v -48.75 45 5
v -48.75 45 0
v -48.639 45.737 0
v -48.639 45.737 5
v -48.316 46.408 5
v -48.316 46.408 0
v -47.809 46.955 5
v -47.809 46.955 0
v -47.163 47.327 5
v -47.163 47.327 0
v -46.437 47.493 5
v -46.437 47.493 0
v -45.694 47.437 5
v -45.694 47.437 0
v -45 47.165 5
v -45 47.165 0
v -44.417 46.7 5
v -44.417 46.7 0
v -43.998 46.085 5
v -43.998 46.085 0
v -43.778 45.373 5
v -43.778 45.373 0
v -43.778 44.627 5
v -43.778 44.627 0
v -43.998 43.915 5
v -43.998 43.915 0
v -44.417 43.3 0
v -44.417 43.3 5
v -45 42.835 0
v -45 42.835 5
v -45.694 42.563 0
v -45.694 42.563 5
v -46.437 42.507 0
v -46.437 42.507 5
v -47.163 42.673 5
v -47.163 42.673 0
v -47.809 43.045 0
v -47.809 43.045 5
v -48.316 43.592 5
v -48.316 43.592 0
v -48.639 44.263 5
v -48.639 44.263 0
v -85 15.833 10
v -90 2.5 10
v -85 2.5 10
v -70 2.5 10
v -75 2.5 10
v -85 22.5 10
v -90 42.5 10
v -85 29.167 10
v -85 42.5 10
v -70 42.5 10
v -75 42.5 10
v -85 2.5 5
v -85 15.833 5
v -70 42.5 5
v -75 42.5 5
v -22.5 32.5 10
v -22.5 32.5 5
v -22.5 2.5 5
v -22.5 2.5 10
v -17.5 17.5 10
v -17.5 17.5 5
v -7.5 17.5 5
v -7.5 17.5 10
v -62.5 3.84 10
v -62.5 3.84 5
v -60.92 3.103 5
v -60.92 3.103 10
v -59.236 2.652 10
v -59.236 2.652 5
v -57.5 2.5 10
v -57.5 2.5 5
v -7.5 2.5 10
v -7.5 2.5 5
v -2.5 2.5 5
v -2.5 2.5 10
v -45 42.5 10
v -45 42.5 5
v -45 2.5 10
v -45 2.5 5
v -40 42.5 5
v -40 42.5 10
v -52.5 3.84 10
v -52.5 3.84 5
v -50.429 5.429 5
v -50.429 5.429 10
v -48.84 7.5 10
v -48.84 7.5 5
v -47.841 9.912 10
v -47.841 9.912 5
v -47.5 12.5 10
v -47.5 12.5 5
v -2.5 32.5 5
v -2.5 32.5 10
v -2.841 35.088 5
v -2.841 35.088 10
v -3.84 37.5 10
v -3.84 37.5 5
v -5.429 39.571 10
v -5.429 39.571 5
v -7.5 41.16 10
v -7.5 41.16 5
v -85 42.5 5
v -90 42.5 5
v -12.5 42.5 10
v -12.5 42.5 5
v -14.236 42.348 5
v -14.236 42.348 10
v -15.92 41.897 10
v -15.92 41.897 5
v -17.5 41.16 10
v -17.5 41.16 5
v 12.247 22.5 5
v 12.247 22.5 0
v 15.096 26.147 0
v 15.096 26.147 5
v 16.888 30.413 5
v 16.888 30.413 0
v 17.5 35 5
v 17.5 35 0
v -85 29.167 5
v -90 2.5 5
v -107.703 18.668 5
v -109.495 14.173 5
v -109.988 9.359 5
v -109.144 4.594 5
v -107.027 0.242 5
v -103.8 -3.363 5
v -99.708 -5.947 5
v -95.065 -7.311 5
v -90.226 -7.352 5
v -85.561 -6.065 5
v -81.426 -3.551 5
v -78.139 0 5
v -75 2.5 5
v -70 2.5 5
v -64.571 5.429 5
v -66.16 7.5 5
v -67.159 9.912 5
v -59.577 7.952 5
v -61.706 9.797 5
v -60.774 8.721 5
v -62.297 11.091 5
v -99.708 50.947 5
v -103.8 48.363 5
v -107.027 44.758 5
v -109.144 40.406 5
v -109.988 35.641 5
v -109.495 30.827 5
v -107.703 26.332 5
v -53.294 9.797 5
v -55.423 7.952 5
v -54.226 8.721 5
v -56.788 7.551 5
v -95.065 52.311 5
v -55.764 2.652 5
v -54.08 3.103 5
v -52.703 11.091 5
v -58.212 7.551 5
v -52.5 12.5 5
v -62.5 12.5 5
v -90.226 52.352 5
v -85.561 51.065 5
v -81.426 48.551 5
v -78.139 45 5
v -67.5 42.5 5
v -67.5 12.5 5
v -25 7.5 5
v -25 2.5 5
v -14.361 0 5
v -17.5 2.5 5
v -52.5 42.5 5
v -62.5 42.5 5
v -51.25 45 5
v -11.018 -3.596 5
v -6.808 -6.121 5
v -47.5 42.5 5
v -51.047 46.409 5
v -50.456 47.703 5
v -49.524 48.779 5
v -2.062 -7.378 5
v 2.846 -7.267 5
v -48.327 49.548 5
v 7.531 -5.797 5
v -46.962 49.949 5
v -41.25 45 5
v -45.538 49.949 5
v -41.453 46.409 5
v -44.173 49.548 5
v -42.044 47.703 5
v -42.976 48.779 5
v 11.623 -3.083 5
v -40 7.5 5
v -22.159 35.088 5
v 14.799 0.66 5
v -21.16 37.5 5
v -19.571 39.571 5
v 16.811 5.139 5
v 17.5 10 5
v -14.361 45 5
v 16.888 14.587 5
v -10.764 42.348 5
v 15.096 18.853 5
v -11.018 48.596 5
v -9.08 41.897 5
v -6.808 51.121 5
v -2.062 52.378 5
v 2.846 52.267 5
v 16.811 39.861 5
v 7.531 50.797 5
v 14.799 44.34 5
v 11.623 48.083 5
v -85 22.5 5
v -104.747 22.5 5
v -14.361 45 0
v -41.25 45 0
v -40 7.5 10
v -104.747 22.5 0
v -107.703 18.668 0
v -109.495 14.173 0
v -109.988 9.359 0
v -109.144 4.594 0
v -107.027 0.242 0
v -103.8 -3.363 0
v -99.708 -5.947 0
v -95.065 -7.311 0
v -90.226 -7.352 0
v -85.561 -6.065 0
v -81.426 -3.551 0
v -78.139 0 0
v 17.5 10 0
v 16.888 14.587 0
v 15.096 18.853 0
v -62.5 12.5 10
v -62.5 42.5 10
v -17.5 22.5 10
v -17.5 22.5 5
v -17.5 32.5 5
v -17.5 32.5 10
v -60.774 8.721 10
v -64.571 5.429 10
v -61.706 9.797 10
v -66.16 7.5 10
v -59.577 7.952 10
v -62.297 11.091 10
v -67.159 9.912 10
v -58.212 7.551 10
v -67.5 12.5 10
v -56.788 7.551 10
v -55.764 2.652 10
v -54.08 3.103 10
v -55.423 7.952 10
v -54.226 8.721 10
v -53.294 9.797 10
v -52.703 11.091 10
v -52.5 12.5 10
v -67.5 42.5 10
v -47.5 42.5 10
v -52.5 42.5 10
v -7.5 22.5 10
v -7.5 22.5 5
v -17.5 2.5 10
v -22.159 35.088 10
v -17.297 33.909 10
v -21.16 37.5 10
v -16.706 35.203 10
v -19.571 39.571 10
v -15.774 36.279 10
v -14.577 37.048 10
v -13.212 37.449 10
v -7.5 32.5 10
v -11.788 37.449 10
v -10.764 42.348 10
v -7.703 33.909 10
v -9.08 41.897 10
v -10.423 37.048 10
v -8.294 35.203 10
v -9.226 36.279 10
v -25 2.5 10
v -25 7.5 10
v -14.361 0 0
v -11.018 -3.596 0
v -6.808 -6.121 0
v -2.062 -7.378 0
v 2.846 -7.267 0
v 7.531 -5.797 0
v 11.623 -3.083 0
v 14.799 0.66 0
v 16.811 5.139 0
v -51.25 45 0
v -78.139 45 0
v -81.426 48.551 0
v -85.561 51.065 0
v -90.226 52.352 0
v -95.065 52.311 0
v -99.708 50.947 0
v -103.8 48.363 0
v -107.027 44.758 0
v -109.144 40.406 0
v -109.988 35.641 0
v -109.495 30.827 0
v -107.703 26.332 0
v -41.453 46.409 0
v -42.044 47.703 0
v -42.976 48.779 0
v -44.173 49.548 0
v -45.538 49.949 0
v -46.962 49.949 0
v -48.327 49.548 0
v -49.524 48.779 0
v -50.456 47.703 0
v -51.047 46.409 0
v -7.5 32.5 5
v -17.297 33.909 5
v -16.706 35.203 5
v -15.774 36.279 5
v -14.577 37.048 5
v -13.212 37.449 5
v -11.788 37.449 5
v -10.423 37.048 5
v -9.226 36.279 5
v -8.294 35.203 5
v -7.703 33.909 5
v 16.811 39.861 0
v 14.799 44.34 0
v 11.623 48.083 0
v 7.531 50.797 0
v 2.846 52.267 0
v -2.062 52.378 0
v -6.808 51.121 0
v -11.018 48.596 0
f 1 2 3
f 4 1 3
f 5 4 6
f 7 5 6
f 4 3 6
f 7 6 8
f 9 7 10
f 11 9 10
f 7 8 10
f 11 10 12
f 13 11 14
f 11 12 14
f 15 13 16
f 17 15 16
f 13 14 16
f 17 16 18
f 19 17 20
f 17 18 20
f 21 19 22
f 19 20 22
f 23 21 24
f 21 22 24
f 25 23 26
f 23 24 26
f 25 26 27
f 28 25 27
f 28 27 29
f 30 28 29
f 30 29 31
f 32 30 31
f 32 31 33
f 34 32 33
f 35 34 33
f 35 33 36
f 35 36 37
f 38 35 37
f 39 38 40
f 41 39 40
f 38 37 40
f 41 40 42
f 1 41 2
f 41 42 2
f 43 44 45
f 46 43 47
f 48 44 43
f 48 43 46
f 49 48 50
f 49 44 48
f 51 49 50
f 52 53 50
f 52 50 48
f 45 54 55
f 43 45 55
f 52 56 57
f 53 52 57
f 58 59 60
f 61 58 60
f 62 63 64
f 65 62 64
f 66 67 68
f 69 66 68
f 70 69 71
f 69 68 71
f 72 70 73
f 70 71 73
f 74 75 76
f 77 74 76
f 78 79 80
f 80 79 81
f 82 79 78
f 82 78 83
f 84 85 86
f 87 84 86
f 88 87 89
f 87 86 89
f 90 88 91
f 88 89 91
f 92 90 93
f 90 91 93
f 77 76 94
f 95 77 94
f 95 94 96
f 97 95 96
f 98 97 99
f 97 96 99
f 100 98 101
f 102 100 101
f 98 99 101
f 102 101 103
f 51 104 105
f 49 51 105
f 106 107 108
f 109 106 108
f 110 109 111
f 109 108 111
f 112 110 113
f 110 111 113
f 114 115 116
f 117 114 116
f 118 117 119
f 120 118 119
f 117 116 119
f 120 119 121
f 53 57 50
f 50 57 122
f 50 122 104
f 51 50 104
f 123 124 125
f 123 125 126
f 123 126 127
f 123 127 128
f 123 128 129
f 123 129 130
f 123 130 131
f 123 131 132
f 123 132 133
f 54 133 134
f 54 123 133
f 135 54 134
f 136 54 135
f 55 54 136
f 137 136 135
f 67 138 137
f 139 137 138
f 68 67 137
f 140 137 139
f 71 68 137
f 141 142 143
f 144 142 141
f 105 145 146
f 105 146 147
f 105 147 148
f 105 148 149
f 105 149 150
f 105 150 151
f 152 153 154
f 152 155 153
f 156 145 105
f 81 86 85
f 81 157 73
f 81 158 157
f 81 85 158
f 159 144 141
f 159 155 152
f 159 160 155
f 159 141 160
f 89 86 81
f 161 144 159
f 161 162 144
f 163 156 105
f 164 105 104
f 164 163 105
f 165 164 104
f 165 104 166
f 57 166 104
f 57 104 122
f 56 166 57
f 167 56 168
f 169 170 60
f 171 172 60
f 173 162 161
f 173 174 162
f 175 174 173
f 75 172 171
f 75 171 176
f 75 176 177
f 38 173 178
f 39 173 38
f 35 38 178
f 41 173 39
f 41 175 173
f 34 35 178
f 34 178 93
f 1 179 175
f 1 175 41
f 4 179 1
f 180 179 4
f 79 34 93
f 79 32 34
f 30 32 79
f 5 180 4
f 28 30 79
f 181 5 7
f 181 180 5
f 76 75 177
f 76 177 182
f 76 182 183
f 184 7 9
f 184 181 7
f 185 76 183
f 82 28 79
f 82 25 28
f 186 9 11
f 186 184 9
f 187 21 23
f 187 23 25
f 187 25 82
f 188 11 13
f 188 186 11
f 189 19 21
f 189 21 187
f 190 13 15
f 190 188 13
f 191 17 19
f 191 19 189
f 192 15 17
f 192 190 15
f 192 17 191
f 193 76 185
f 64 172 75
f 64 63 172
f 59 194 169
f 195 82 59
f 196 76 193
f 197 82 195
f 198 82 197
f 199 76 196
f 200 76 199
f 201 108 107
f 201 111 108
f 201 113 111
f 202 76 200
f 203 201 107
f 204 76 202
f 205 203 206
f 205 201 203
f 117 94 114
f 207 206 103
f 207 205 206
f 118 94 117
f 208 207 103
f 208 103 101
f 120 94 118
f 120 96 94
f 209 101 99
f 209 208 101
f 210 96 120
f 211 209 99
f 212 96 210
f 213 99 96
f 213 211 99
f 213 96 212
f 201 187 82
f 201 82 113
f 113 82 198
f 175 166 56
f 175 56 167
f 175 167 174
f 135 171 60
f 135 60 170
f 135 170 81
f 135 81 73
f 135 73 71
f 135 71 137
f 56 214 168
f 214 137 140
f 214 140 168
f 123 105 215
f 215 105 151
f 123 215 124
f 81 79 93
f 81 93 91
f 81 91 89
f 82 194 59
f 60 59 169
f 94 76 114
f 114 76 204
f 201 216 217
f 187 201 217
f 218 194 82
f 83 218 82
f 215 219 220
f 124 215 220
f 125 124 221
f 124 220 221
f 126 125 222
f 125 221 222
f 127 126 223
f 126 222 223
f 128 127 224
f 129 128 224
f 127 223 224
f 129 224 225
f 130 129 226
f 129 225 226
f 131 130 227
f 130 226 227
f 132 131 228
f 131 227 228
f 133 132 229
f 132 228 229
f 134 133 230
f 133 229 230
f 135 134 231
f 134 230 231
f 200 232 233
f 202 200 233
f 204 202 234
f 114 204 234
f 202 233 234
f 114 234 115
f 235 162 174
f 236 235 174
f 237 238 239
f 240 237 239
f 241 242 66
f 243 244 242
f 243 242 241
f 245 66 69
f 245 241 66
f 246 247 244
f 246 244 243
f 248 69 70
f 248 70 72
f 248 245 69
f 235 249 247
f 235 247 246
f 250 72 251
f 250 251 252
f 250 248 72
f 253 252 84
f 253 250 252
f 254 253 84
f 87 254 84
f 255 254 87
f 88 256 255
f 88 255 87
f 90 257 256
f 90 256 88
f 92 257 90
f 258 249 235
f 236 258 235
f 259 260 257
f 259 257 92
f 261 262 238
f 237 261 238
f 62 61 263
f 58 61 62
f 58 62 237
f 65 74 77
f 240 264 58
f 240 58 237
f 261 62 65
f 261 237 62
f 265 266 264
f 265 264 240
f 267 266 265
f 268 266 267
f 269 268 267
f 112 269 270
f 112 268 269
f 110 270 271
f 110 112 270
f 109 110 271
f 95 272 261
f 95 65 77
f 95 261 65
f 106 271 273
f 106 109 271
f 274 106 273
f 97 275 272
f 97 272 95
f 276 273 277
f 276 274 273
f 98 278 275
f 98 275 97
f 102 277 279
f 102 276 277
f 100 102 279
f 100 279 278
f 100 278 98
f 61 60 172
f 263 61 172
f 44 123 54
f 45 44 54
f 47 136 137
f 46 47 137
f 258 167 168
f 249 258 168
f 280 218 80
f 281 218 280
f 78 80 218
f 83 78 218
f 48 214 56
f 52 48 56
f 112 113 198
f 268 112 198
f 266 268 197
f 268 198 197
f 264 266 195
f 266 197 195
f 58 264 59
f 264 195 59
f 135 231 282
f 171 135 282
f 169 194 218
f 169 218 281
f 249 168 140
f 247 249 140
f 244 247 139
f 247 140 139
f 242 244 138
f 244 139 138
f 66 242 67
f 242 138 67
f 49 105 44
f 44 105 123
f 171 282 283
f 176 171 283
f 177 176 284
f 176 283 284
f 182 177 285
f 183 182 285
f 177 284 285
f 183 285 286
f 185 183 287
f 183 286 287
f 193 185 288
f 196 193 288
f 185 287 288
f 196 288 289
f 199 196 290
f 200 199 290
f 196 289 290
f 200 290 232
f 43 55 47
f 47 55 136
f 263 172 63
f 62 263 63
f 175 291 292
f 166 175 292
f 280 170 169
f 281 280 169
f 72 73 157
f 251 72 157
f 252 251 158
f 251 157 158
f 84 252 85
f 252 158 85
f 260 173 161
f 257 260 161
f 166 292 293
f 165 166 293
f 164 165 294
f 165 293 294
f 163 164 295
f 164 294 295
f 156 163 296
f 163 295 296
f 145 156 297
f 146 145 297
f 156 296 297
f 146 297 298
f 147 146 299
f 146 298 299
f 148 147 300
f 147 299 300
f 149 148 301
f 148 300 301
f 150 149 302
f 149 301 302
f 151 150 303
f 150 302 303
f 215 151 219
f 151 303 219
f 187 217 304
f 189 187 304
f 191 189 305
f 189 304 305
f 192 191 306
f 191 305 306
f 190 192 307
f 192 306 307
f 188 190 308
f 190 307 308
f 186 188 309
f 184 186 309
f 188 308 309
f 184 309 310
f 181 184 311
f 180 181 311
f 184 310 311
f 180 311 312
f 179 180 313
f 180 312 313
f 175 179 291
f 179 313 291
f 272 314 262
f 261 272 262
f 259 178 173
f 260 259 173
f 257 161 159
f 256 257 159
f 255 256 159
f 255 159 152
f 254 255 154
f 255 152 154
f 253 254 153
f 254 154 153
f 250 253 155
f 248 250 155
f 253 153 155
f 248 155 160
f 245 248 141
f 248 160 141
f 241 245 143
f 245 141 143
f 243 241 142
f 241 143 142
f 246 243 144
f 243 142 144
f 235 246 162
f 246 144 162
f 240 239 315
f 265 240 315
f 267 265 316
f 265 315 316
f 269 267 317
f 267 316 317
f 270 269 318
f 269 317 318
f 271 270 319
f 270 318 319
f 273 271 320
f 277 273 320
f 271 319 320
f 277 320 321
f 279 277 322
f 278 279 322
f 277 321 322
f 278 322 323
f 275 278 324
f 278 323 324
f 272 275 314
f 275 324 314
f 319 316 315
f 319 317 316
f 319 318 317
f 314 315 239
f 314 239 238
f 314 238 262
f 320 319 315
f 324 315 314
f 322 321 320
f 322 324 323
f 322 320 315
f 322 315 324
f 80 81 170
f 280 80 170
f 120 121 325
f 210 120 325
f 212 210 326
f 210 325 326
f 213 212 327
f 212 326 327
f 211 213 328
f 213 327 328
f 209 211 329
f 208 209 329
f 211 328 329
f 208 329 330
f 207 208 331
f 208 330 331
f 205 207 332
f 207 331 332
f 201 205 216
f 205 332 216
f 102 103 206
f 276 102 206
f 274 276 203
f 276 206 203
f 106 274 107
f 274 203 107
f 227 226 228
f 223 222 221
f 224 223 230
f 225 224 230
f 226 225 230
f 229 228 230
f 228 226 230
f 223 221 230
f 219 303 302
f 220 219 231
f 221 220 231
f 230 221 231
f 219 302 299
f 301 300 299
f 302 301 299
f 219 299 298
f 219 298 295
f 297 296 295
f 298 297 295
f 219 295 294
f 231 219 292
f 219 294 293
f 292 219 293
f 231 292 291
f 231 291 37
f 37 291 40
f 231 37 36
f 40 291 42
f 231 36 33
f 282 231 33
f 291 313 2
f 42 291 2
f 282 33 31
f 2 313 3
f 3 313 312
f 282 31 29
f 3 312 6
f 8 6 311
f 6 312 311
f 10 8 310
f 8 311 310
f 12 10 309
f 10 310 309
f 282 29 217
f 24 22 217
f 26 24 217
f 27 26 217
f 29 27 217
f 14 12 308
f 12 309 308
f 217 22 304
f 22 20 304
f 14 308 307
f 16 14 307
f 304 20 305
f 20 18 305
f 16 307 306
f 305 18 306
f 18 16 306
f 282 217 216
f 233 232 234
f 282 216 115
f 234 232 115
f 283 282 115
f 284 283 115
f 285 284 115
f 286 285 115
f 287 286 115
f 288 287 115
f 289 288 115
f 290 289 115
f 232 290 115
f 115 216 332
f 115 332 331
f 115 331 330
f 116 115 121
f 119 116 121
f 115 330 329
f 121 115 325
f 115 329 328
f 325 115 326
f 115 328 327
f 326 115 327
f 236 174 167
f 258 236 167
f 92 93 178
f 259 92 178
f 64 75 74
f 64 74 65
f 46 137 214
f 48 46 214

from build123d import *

# Parameters (mm, degrees)
F1_DEPTH = 5
F2_W     = 5
F2_H     = 35
F2_H_2   = 5
F2_W_2   = 15
F2_H_3   = 15
F3_DEPTH = 5


with BuildPart() as f1:
    # F0 (on Top) → F1 (new body)
    with BuildSketch(Plane.XY):
        with BuildLine():
            Line((-92.5, 45), (-78.1385933837, 45))
            ThreePointArc((-78.1385933837, 45), (-103.7995444379, 48.3630196998), (-104.7474487139, 22.5))
            ThreePointArc((-104.7474487139, 22.5), (-99.1143782777, 26.201851746), (-92.5, 27.5))
            Line((-92.5, 27.5), (-92.5, 45))
        make_face()
        with BuildLine():
            Line((-92.5, 17.5), (-92.5, 27.5))
            ThreePointArc((-92.5, 27.5), (-99.1143782777, 26.201851746), (-104.7474487139, 22.5))
            ThreePointArc((-104.7474487139, 22.5), (-99.1143782777, 18.798148254), (-92.5, 17.5))
        make_face()
        with BuildLine():
            ThreePointArc((-92.5, 17.5), (-99.1143782777, 18.798148254), (-104.7474487139, 22.5))
            ThreePointArc((-104.7474487139, 22.5), (-103.7995444379, -3.3630196998), (-78.1385933837, 0))
            Line((-78.1385933837, 0), (-92.5, 0))
            Line((-92.5, 0), (-92.5, 17.5))
        make_face()
        with BuildLine():
            Line((-90, 17.6794919243), (-90, 27.3205080757))
            ThreePointArc((-90, 27.3205080757), (-91.2467824061, 27.4550693399), (-92.5, 27.5))
            Line((-92.5, 27.5), (-92.5, 17.5))
            ThreePointArc((-92.5, 17.5), (-91.2467824061, 17.5449306601), (-90, 17.6794919243))
        make_face()
        with BuildLine():
            Line((-90, 27.3205080757), (-90, 42.5))
            Line((-90, 42.5), (-76.6886116992, 42.5))
            ThreePointArc((-76.6886116992, 42.5), (-77.3619060553, 43.7799835832), (-78.1385933837, 45))
            Line((-78.1385933837, 45), (-92.5, 45))
            Line((-92.5, 45), (-92.5, 27.5))
            ThreePointArc((-92.5, 27.5), (-91.2467824061, 27.4550693399), (-90, 27.3205080757))
        make_face()
        with BuildLine():
            Line((-76.6886116992, 42.5), (-90, 42.5))
            Line((-90, 42.5), (-90, 27.3205080757))
            ThreePointArc((-90, 27.3205080757), (-84.7423498777, 25.6865823104), (-80.2525512861, 22.5))
            ThreePointArc((-80.2525512861, 22.5), (-76.3664890291, 28.2206324961), (-75, 35))
            ThreePointArc((-75, 35), (-75.4273713907, 38.843872054), (-76.6886116992, 42.5))
        make_face()
        with BuildLine():
            ThreePointArc((-80.2525512861, 22.5), (-84.7423498777, 25.6865823104), (-90, 27.3205080757))
            Line((-90, 27.3205080757), (-90, 17.6794919243))
            ThreePointArc((-90, 17.6794919243), (-84.7423498777, 19.3134176896), (-80.2525512861, 22.5))
        make_face()
        with BuildLine():
            ThreePointArc((-80.2525512861, 22.5), (-84.7423498777, 19.3134176896), (-90, 17.6794919243))
            Line((-90, 17.6794919243), (-90, 2.5))
            Line((-90, 2.5), (-76.6886116992, 2.5))
            ThreePointArc((-76.6886116992, 2.5), (-75.4273713907, 6.156127946), (-75, 10))
            ThreePointArc((-75, 10), (-76.3664890291, 16.7793675039), (-80.2525512861, 22.5))
        make_face()
        with BuildLine():
            Line((-90, 2.5), (-90, 17.6794919243))
            ThreePointArc((-90, 17.6794919243), (-91.2467824061, 17.5449306601), (-92.5, 17.5))
            Line((-92.5, 17.5), (-92.5, 0))
            Line((-92.5, 0), (-78.1385933837, 0))
            ThreePointArc((-78.1385933837, 0), (-77.3619060553, 1.2200164168), (-76.6886116992, 2.5))
            Line((-76.6886116992, 2.5), (-90, 2.5))
        make_face()
        with BuildLine():
            Line((-70, 42.5), (-76.6886116992, 42.5))
            ThreePointArc((-76.6886116992, 42.5), (-75.4273713907, 38.843872054), (-75, 35))
            ThreePointArc((-75, 35), (-76.3664890291, 28.2206324961), (-80.2525512861, 22.5))
            ThreePointArc((-80.2525512861, 22.5), (-76.3664890291, 16.7793675039), (-75, 10))
            ThreePointArc((-75, 10), (-75.4273713907, 6.156127946), (-76.6886116992, 2.5))
            Line((-76.6886116992, 2.5), (-70, 2.5))
            Line((-70, 2.5), (-70, 42.5))
        make_face()
        with BuildLine():
            ThreePointArc((-78.1385933837, 45), (-77.3619060553, 43.7799835832), (-76.6886116992, 42.5))
            Line((-76.6886116992, 42.5), (-70, 42.5))
            Line((-70, 42.5), (-70, 2.5))
            Line((-70, 2.5), (-76.6886116992, 2.5))
            ThreePointArc((-76.6886116992, 2.5), (-77.3619060553, 1.2200164168), (-78.1385933837, 0))
            Line((-78.1385933837, 0), (-14.3614066163, 0))
            ThreePointArc((-14.3614066163, 0), (-15.1380939447, 1.2200164168), (-15.8113883008, 2.5))
            Line((-15.8113883008, 2.5), (-22.5, 2.5))
            Line((-22.5, 2.5), (-22.5, 42.5))
            Line((-22.5, 42.5), (-15.8113883008, 42.5))
            ThreePointArc((-15.8113883008, 42.5), (-15.1380939447, 43.7799835832), (-14.3614066163, 45))
            Line((-14.3614066163, 45), (-41.25, 45))
            ThreePointArc((-41.25, 45), (-41.4203708686, 43.7059047745), (-41.9198729811, 42.5))
            Line((-41.9198729811, 42.5), (-25, 42.5))
            Line((-25, 42.5), (-25, 2.5))
            Line((-25, 2.5), (-45, 2.5))
            Line((-45, 2.5), (-45, 40.1587708172))
            ThreePointArc((-45, 40.1587708172), (-46.25, 40), (-47.5, 40.1587708172))
            Line((-47.5, 40.1587708172), (-47.5, 2.5))
            Line((-47.5, 2.5), (-67.5, 2.5))
            Line((-67.5, 2.5), (-67.5, 42.5))
            Line((-67.5, 42.5), (-50.5801270189, 42.5))
            ThreePointArc((-50.5801270189, 42.5), (-51.0796291314, 43.7059047745), (-51.25, 45))
            Line((-51.25, 45), (-78.1385933837, 45))
        make_face()
        with BuildLine():
            ThreePointArc((-47.5, 40.1587708172), (-49.275688832, 41.0193961398), (-50.5801270189, 42.5))
            Line((-50.5801270189, 42.5), (-67.5, 42.5))
            Line((-67.5, 42.5), (-67.5, 2.5))
            Line((-67.5, 2.5), (-47.5, 2.5))
            Line((-47.5, 2.5), (-47.5, 40.1587708172))
        make_face()
        with BuildLine():
            Line((-47.5, 42.5), (-50.5801270189, 42.5))
            ThreePointArc((-50.5801270189, 42.5), (-49.275688832, 41.0193961398), (-47.5, 40.1587708172))
            Line((-47.5, 40.1587708172), (-47.5, 42.5))
        make_face()
        with BuildLine():
            ThreePointArc((-45, 40.1587708172), (-43.224311168, 41.0193961398), (-41.9198729811, 42.5))
            Line((-41.9198729811, 42.5), (-45, 42.5))
            Line((-45, 42.5), (-45, 40.1587708172))
        make_face()
        with BuildLine():
            Line((-25, 42.5), (-41.9198729811, 42.5))
            ThreePointArc((-41.9198729811, 42.5), (-43.224311168, 41.0193961398), (-45, 40.1587708172))
            Line((-45, 40.1587708172), (-45, 2.5))
            Line((-45, 2.5), (-25, 2.5))
            Line((-25, 2.5), (-25, 42.5))
        make_face()
        with BuildLine():
            ThreePointArc((-12.2474487139, 22.5), (-17.2285978436, 31.9299159059), (-15.8113883008, 42.5))
            Line((-15.8113883008, 42.5), (-22.5, 42.5))
            Line((-22.5, 42.5), (-22.5, 2.5))
            Line((-22.5, 2.5), (-15.8113883008, 2.5))
            ThreePointArc((-15.8113883008, 2.5), (-17.2285978436, 13.0700840941), (-12.2474487139, 22.5))
        make_face()
        with BuildLine():
            Line((-2.5, 42.5), (-15.8113883008, 42.5))
            ThreePointArc((-15.8113883008, 42.5), (-17.2285978436, 31.9299159059), (-12.2474487139, 22.5))
            ThreePointArc((-12.2474487139, 22.5), (-7.7576501223, 25.6865823104), (-2.5, 27.3205080757))
            Line((-2.5, 27.3205080757), (-2.5, 42.5))
        make_face()
        with BuildLine():
            ThreePointArc((17.5, 35), (5.2404858655, 51.6969251029), (-14.3614066163, 45))
            Line((-14.3614066163, 45), (0, 45))
            Line((0, 45), (0, 27.5))
            ThreePointArc((0, 27.5), (6.6143782777, 26.201851746), (12.2474487139, 22.5))
            ThreePointArc((12.2474487139, 22.5), (16.1335109709, 28.2206324961), (17.5, 35))
        make_face()
        with BuildLine():
            Line((0, 0), (-14.3614066163, 0))
            ThreePointArc((-14.3614066163, 0), (5.2404858655, -6.6969251029), (17.5, 10))
            ThreePointArc((17.5, 10), (16.1335109709, 16.7793675039), (12.2474487139, 22.5))
            ThreePointArc((12.2474487139, 22.5), (6.6143782777, 18.798148254), (0, 17.5))
            Line((0, 17.5), (0, 0))
        make_face()
        with BuildLine():
            ThreePointArc((-12.2474487139, 22.5), (-17.2285978436, 13.0700840941), (-15.8113883008, 2.5))
            Line((-15.8113883008, 2.5), (-2.5, 2.5))
            Line((-2.5, 2.5), (-2.5, 17.6794919243))
            ThreePointArc((-2.5, 17.6794919243), (-7.7576501223, 19.3134176896), (-12.2474487139, 22.5))
        make_face()
        with BuildLine():
            ThreePointArc((-2.5, 27.3205080757), (-7.7576501223, 25.6865823104), (-12.2474487139, 22.5))
            ThreePointArc((-12.2474487139, 22.5), (-7.7576501223, 19.3134176896), (-2.5, 17.6794919243))
            Line((-2.5, 17.6794919243), (-2.5, 27.3205080757))
        make_face()
        with BuildLine():
            ThreePointArc((12.2474487139, 22.5), (6.6143782777, 26.201851746), (0, 27.5))
            Line((0, 27.5), (0, 17.5))
            ThreePointArc((0, 17.5), (6.6143782777, 18.798148254), (12.2474487139, 22.5))
        make_face()
        with BuildLine():
            ThreePointArc((-15.8113883008, 2.5), (-15.1380939447, 1.2200164168), (-14.3614066163, 0))
            Line((-14.3614066163, 0), (0, 0))
            Line((0, 0), (0, 17.5))
            ThreePointArc((0, 17.5), (-1.2532175939, 17.5449306601), (-2.5, 17.6794919243))
            Line((-2.5, 17.6794919243), (-2.5, 2.5))
            Line((-2.5, 2.5), (-15.8113883008, 2.5))
        make_face()
        with BuildLine():
            Line((0, 45), (-14.3614066163, 45))
            ThreePointArc((-14.3614066163, 45), (-15.1380939447, 43.7799835832), (-15.8113883008, 42.5))
            Line((-15.8113883008, 42.5), (-2.5, 42.5))
            Line((-2.5, 42.5), (-2.5, 27.3205080757))
            ThreePointArc((-2.5, 27.3205080757), (-1.2532175939, 27.4550693399), (0, 27.5))
            Line((0, 27.5), (0, 45))
        make_face()
        with BuildLine():
            Line((0, 17.5), (0, 27.5))
            ThreePointArc((0, 27.5), (-1.2532175939, 27.4550693399), (-2.5, 27.3205080757))
            Line((-2.5, 27.3205080757), (-2.5, 17.6794919243))
            ThreePointArc((-2.5, 17.6794919243), (-1.2532175939, 17.5449306601), (0, 17.5))
        make_face()
        with BuildLine():
            Line((-48.75, 45), (-51.25, 45))
            ThreePointArc((-51.25, 45), (-51.0796291314, 43.7059047745), (-50.5801270189, 42.5))
            Line((-50.5801270189, 42.5), (-47.5, 42.5))
            Line((-47.5, 42.5), (-47.5, 40.1587708172))
            ThreePointArc((-47.5, 40.1587708172), (-46.25, 40), (-45, 40.1587708172))
            Line((-45, 40.1587708172), (-45, 42.5))
            Line((-45, 42.5), (-41.9198729811, 42.5))
            ThreePointArc((-41.9198729811, 42.5), (-41.4203708686, 43.7059047745), (-41.25, 45))
            Line((-41.25, 45), (-43.75, 45))
            ThreePointArc((-43.75, 45), (-46.25, 42.5), (-48.75, 45))
        make_face()
        with BuildLine():
            ThreePointArc((-41.25, 45), (-46.25, 50), (-51.25, 45))
            Line((-51.25, 45), (-48.75, 45))
            ThreePointArc((-48.75, 45), (-46.25, 47.5), (-43.75, 45))
            Line((-43.75, 45), (-41.25, 45))
        make_face()
    extrude(amount=F1_DEPTH)

    # F2 (on face) → F3 (join)
    with BuildSketch(Plane.XY.offset(5)):
        Polygon((-85, 42.5), (-90, 42.5), (-90, 22.5), (-85, 29.1666666667), align=None)
        Polygon((-85, 29.1666666667), (-90, 22.5), (-85, 15.8333333333), (-85, 22.5), align=None)
        Polygon((-85, 15.8333333333), (-90, 22.5), (-90, 2.5), (-85, 2.5), align=None)
        Polygon((-85, 22.5), (-85, 15.8333333333), (-75, 2.5), (-70, 2.5), align=None)
        Polygon((-70, 42.5), (-75, 42.5), (-85, 29.1666666667), (-85, 22.5), align=None)
        with BuildLine():
            Line((-62.5, 42.5), (-67.5, 42.5))
            Line((-67.5, 42.5), (-67.5, 12.5))
            ThreePointArc((-67.5, 12.5), (-66.1602540378, 17.5), (-62.5, 21.1602540378))
            Line((-62.5, 21.1602540378), (-62.5, 42.5))
        make_face()
        with BuildLine():
            ThreePointArc((-62.5, 21.1602540378), (-66.1602540378, 17.5), (-67.5, 12.5))
            ThreePointArc((-67.5, 12.5), (-66.1602540378, 7.5), (-62.5, 3.8397459622))
            Line((-62.5, 3.8397459622), (-62.5, 12.5000000871))
            Line((-62.5, 12.5000000871), (-62.5, 21.1602540378))
        make_face()
        with BuildLine():
            Line((-62.5, 12.5000000871), (-62.5, 3.8397459622))
            ThreePointArc((-62.5, 3.8397459622), (-60.088190451, 2.8407417371), (-57.5, 2.5))
            ThreePointArc((-57.5, 2.5), (-54.911809549, 2.8407417371), (-52.5, 3.8397459622))
            Line((-52.5, 3.8397459622), (-52.5, 12.5))
            ThreePointArc((-52.5, 12.5), (-57.5000000436, 7.5), (-62.5, 12.5000000871))
        make_face()
        with BuildLine():
            ThreePointArc((-47.5, 12.5), (-48.8397459622, 17.5), (-52.5, 21.1602540378))
            Line((-52.5, 21.1602540378), (-52.5, 12.5))
            Line((-52.5, 12.5), (-52.5, 3.8397459622))
            ThreePointArc((-52.5, 3.8397459622), (-48.8397459622, 7.5), (-47.5, 12.5))
        make_face()
        with BuildLine():
            Line((-47.5, 42.5), (-52.5, 42.5))
            Line((-52.5, 42.5), (-52.5, 21.1602540378))
            ThreePointArc((-52.5, 21.1602540378), (-48.8397459622, 17.5), (-47.5, 12.5))
            Line((-47.5, 12.5), (-47.5, 42.5))
        make_face()
        with Locations((-42.5, 25)):
            Rectangle(F2_W, F2_H)
        with Locations((-42.5, 5)):
            Rectangle(F2_W, F2_H_2)
        with Locations((-32.5, 5)):
            Rectangle(F2_W_2, F2_H_2)
        with BuildLine():
            ThreePointArc((-17.5, 41.1602540378), (-21.1602540378, 37.5), (-22.5, 32.5))
            ThreePointArc((-22.5, 32.5), (-21.1602540378, 27.5), (-17.5, 23.8397459622))
            Line((-17.5, 23.8397459622), (-17.5, 32.5))
            Line((-17.5, 32.5), (-17.5, 41.1602540378))
        make_face()
        with BuildLine():
            ThreePointArc((-7.5, 41.1602540378), (-9.911809549, 42.1592582629), (-12.5, 42.5))
            ThreePointArc((-12.5, 42.5), (-15.088190451, 42.1592582629), (-17.5, 41.1602540378))
            Line((-17.5, 41.1602540378), (-17.5, 32.5))
            ThreePointArc((-17.5, 32.5), (-12.5, 37.5), (-7.5, 32.5))
            Line((-7.5, 32.5), (-7.5, 41.1602540378))
        make_face()
        with BuildLine():
            ThreePointArc((-2.5, 32.5), (-3.8397459622, 37.5), (-7.5, 41.1602540378))
            Line((-7.5, 41.1602540378), (-7.5, 32.5))
            Line((-7.5, 32.5), (-7.5, 23.8397459622))
            ThreePointArc((-7.5, 23.8397459622), (-3.8397459622, 27.5), (-2.5, 32.5))
        make_face()
        Polygon((-12.5, 22.5), (-17.5, 22.5), (-17.5, 17.5), (-7.5, 17.5), (-7.5, 22.5), align=None)
        with Locations((-20, 20)):
            Rectangle(F2_W, F2_H_2)
        with BuildLine():
            ThreePointArc((-17.5, 23.8397459622), (-21.1602540378, 27.5), (-22.5, 32.5))
            Line((-22.5, 32.5), (-22.5, 22.5))
            Line((-22.5, 22.5), (-17.5, 22.5))
            Line((-17.5, 22.5), (-17.5, 23.8397459622))
        make_face()
        with BuildLine():
            Line((-2.5, 22.5), (-2.5, 32.5))
            ThreePointArc((-2.5, 32.5), (-3.8397459622, 27.5), (-7.5, 23.8397459622))
            Line((-7.5, 23.8397459622), (-7.5, 22.5))
            Line((-7.5, 22.5), (-2.5, 22.5))
        make_face()
        with Locations((-5, 20)):
            Rectangle(F2_W, F2_H_2)
        with Locations((-5, 10)):
            Rectangle(F2_W, F2_H_3)
        with Locations((-20, 10)):
            Rectangle(F2_W, F2_H_3)
    extrude(amount=F3_DEPTH)


solid = f1.part
